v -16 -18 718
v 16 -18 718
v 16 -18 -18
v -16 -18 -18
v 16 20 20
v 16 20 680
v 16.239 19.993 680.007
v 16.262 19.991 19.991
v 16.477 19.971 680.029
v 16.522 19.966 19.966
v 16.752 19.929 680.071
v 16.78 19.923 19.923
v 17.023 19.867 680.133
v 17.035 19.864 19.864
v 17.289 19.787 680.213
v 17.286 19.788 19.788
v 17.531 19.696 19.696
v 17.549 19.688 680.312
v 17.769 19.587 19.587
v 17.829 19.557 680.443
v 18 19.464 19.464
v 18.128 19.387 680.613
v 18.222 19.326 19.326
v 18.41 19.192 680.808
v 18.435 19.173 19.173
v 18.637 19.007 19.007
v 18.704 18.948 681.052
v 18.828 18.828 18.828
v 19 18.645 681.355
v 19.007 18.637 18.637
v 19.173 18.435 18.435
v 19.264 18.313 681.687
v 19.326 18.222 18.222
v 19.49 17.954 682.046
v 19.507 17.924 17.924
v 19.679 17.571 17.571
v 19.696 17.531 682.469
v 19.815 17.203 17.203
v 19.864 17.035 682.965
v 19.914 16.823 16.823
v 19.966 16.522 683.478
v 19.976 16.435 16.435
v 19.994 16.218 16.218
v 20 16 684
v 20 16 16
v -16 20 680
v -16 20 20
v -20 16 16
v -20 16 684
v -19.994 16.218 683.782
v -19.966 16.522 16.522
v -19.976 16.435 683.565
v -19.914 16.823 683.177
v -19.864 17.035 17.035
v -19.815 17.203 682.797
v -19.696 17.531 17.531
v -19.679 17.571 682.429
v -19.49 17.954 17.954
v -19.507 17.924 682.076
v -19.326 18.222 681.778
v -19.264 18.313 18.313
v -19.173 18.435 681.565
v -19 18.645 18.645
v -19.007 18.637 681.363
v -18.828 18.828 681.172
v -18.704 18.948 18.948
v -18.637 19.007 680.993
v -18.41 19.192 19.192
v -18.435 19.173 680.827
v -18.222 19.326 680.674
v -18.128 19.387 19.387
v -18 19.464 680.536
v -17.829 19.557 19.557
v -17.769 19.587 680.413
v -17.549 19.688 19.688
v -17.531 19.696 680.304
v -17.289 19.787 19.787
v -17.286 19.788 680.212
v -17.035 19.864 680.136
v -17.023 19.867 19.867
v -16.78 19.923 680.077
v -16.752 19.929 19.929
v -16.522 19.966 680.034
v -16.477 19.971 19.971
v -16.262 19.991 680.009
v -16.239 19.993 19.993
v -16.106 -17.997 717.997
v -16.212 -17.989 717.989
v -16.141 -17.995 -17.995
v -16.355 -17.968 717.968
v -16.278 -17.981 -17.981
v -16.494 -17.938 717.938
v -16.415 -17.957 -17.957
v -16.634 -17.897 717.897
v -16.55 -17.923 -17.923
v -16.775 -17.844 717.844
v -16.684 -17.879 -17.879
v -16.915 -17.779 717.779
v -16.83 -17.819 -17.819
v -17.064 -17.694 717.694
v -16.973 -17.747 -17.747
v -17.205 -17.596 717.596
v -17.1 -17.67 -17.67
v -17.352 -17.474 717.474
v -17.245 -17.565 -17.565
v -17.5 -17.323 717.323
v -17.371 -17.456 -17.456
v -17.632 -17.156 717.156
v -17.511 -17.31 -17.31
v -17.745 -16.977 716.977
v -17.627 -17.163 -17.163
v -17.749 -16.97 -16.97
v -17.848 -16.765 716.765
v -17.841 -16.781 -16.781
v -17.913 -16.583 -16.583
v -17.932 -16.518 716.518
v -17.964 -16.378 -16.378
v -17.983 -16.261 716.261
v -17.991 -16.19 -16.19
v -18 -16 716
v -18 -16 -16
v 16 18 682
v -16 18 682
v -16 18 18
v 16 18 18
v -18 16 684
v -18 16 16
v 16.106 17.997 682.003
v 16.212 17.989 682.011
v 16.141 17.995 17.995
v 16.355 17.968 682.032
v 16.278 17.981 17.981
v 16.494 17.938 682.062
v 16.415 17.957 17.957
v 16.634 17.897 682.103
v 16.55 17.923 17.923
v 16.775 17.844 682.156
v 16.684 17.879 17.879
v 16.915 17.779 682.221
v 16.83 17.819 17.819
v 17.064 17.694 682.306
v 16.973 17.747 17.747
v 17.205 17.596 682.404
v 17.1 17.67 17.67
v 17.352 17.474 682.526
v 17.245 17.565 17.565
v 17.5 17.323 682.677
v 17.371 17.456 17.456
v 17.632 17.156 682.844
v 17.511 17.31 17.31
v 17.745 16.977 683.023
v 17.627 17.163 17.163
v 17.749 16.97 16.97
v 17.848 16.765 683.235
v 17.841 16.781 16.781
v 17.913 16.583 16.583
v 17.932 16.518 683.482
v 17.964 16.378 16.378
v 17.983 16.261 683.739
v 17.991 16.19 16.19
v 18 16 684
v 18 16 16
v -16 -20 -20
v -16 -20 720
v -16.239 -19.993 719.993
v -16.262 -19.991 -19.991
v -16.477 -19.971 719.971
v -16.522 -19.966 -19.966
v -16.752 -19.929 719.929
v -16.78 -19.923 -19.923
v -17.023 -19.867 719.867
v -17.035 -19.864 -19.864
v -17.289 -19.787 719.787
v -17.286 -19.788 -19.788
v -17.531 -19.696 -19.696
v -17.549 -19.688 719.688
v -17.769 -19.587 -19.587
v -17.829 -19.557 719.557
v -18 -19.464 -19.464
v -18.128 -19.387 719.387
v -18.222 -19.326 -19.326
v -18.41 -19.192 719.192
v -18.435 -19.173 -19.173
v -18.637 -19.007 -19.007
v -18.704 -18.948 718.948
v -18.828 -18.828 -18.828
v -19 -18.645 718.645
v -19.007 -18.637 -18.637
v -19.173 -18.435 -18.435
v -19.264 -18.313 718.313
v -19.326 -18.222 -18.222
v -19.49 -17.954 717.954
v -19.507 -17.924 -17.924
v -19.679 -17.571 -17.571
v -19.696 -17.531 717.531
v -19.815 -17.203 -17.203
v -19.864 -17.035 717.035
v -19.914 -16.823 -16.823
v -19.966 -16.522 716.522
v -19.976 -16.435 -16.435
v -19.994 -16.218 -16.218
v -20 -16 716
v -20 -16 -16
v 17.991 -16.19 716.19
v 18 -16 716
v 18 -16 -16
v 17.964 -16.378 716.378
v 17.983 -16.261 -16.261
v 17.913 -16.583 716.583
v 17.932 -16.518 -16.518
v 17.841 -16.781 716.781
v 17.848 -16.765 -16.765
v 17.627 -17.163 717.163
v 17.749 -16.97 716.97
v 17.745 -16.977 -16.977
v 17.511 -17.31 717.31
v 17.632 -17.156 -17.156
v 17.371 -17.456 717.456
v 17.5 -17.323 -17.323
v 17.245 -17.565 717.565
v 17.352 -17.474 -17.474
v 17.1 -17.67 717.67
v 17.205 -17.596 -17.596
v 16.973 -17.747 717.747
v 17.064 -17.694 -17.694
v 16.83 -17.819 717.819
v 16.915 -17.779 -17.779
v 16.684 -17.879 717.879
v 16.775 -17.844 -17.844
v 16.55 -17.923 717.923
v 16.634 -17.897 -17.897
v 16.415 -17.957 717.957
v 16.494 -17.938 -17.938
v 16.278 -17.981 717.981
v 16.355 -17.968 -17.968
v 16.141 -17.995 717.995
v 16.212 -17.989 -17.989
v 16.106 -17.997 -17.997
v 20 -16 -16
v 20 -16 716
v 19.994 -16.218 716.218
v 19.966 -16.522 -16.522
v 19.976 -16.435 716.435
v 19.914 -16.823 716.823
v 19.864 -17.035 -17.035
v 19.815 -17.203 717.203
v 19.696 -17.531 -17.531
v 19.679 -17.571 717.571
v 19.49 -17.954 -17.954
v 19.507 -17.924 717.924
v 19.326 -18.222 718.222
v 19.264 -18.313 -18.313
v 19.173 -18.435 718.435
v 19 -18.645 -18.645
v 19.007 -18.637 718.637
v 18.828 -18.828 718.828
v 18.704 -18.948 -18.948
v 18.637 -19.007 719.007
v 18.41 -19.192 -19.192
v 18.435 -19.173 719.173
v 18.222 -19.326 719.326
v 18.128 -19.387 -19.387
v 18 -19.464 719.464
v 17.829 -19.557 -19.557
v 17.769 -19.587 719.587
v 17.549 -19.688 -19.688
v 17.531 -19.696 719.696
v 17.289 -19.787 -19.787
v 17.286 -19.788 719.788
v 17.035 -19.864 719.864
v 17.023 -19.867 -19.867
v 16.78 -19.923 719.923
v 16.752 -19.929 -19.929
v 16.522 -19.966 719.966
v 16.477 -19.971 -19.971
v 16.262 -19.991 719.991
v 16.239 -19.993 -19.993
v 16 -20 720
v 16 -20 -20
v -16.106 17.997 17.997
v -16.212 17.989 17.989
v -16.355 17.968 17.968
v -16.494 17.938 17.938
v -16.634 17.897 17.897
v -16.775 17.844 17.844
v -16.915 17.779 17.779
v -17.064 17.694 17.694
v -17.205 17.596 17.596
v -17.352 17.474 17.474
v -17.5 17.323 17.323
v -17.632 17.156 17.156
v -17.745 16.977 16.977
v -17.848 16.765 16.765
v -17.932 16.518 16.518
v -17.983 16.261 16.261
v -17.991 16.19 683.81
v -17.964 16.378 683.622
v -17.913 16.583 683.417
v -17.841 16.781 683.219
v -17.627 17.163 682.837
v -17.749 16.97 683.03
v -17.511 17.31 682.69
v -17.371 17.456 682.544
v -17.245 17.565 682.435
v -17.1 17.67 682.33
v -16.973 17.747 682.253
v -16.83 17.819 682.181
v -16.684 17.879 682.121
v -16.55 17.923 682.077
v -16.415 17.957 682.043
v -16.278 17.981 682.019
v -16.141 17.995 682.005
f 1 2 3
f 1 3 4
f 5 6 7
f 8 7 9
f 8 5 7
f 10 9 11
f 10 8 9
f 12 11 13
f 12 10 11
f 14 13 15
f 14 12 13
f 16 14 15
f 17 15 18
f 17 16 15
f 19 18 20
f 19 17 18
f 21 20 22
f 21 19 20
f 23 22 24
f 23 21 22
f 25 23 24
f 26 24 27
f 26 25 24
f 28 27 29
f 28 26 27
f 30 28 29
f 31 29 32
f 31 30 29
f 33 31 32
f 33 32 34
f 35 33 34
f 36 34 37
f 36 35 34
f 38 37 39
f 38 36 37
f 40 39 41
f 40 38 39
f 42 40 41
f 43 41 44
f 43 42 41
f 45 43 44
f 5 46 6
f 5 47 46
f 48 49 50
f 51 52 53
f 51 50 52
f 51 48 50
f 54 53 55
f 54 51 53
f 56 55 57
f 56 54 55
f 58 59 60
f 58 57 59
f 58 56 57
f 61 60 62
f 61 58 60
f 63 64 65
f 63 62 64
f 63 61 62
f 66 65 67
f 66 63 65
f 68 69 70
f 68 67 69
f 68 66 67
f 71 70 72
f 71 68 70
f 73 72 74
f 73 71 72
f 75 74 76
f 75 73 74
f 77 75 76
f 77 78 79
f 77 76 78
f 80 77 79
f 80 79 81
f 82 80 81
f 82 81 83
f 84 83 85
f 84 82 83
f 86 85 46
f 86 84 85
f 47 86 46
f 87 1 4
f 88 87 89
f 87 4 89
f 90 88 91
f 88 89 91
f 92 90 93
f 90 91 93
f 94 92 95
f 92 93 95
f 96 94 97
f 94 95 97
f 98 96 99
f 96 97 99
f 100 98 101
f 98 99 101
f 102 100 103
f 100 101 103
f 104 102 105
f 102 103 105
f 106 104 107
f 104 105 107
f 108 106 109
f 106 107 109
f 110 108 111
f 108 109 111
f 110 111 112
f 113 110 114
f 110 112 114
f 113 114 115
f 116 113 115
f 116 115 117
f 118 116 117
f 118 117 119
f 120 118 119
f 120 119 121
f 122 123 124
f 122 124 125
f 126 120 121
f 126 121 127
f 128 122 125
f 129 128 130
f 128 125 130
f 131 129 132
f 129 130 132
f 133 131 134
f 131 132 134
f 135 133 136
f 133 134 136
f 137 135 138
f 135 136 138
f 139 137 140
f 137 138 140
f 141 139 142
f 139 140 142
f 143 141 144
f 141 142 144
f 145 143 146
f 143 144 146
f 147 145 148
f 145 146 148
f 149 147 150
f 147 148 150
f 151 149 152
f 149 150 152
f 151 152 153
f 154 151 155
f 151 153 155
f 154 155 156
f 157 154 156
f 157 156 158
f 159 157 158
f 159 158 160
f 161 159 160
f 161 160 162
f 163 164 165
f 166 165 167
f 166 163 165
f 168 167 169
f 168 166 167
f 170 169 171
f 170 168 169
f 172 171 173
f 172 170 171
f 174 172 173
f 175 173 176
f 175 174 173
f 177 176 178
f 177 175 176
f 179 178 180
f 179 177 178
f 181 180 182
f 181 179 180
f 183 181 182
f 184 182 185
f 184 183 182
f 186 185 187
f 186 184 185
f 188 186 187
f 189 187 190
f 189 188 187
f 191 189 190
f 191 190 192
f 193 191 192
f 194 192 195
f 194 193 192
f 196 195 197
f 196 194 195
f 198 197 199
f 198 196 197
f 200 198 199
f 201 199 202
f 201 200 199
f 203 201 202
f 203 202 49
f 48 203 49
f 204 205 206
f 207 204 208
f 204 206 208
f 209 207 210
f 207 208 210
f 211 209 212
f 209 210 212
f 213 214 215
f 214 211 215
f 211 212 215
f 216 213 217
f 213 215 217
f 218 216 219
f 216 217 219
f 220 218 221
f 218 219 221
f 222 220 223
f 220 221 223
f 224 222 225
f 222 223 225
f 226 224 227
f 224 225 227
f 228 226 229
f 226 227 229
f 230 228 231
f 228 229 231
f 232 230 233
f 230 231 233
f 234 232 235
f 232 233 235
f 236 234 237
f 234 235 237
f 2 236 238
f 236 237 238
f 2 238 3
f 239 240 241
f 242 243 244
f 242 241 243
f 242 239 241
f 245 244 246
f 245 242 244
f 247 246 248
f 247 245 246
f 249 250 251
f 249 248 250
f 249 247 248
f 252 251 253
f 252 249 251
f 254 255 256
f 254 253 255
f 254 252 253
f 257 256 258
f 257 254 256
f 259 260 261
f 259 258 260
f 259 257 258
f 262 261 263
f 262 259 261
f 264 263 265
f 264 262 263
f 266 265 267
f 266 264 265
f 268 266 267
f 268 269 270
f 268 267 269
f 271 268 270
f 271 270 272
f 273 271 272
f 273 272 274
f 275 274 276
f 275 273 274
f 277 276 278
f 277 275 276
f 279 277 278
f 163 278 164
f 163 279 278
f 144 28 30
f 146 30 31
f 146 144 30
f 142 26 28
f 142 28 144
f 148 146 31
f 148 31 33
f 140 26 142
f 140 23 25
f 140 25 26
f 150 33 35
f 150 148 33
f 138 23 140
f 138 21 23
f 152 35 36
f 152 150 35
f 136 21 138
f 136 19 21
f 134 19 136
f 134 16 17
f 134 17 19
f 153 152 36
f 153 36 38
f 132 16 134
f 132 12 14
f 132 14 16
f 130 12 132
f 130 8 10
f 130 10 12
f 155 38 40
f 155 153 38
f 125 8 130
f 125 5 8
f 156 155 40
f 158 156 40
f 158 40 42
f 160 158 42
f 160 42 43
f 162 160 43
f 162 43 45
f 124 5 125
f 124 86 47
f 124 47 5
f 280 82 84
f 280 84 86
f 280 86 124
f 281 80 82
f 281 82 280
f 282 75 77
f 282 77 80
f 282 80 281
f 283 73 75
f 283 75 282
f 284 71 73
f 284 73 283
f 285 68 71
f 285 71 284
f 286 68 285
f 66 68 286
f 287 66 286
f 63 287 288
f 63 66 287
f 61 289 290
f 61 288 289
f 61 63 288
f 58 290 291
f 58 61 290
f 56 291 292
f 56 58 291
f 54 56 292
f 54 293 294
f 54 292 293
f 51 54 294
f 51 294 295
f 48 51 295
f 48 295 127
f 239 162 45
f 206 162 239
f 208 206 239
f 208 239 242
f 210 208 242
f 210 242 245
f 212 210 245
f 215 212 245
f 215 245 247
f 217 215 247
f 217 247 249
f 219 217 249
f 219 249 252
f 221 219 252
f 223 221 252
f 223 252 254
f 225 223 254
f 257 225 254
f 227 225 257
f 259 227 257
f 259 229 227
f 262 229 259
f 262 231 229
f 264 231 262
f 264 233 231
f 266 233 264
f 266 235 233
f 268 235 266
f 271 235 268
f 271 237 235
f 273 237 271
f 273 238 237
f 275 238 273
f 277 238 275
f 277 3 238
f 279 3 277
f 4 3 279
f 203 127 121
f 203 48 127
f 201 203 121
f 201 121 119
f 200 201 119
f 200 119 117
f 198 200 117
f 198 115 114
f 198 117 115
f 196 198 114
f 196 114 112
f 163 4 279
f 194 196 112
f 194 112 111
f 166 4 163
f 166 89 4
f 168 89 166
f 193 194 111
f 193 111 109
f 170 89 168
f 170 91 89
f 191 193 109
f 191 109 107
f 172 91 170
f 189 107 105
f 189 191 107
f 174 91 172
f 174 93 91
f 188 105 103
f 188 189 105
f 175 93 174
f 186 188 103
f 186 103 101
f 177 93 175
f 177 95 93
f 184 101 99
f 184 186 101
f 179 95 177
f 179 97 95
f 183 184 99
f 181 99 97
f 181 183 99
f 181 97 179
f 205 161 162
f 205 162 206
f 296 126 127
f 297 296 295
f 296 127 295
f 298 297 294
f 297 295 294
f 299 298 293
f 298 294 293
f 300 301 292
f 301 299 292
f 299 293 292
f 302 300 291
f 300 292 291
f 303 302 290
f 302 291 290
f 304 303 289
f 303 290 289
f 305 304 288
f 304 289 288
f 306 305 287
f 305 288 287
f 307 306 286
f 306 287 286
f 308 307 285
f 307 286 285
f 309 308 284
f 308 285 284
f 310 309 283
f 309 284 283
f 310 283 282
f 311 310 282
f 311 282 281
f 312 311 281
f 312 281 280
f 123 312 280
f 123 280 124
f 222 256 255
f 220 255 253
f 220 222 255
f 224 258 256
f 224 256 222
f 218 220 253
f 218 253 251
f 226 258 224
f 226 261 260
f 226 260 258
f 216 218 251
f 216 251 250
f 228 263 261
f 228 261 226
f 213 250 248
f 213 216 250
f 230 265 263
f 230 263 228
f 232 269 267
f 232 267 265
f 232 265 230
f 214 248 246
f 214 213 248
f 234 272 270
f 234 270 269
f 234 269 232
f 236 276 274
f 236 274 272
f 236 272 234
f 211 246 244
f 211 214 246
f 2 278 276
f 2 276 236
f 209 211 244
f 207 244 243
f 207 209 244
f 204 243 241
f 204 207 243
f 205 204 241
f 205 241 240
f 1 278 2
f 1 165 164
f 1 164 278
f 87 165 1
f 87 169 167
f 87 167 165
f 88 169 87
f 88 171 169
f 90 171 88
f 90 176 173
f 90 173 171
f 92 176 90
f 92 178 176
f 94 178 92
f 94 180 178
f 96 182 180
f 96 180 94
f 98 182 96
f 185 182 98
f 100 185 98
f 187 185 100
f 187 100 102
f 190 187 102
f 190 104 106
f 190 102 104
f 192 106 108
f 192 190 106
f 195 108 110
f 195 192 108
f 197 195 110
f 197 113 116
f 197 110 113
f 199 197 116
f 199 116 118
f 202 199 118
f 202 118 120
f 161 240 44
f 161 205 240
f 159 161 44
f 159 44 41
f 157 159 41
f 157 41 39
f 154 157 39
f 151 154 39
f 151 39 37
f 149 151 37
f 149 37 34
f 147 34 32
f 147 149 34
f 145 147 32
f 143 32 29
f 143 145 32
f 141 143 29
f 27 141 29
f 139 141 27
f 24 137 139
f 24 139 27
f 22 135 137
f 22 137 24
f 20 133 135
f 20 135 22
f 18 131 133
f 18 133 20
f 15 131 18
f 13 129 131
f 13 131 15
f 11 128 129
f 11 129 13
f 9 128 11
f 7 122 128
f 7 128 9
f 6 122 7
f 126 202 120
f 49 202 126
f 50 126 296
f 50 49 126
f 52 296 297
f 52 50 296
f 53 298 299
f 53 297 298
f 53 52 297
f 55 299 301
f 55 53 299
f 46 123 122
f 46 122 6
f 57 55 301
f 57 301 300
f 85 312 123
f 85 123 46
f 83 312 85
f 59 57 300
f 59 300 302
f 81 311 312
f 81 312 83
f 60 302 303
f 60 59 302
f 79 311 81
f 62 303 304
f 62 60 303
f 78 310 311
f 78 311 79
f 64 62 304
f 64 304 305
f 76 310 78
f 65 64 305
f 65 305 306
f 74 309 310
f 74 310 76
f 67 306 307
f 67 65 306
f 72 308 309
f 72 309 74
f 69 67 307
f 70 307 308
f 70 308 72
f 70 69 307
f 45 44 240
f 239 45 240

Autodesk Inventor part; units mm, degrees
ref_plane "Start plane" through (0, 0, -20) normal (0, 0, 1) x (1, 0, 0)
ref_plane "End plane" through (0, 0, 720) normal (0, 0, 1) x (1, 0, 0)
sketch "Sketch" plane through (0, 0, 0) normal (0, 0, 1) x (1, 0, 0)
  line L0 (-20, -16) -> (-20, 16)
  line L1 (-16, 20) -> (16, 20)
  line L2 (20, 16) -> (20, -16)
  line L3 (16, -20) -> (-16, -20)
  arc A0 (-20, -16) -> (-16, -20) centre (-16, -16) ccw
  arc A1 (20, 16) -> (16, 20) centre (16, 16) ccw
  arc A2 (-16, 20) -> (-20, 16) centre (-16, 16) ccw
  arc A3 (16, -20) -> (20, -16) centre (16, -16) ccw
  arc A4 (-16, 18) -> (-18, 16) centre (-16, 16) ccw
  line L4 (-16, 18) -> (16, 18)
  arc A5 (18, 16) -> (16, 18) centre (16, 16) ccw
  line L5 (18, 16) -> (18, -16)
  arc A6 (16, -18) -> (18, -16) centre (16, -16) ccw
  line L6 (16, -18) -> (-16, -18)
  arc A7 (-18, -16) -> (-16, -18) centre (-16, -16) ccw
  line L7 (-18, -16) -> (-18, 16)
  line L8 (0, 29.1598) -> (0, -29.1598) construction
  line L9 (-29.1598, 0) -> (29.1598, 0) construction
  dimension "d7" = 4
  dimension "d9" = 40
  dimension "d11" = 40
  dimension "d12" = 2
  dimension "d15" = 20
  dimension "d16" = 20
extrude "Body" add sketch "Sketch" along normal up to surface (740 mm away) from surface at -20
sketch "Sketch3" plane through (0, 0, 0) normal (0, 0, 1) x (1, 0, 0)
  line L0 (0, 0) -> (10, 0)
ref_plane "Work Plane3" through (0, 0, 0) normal (0, -1, 0) x (1, 0, 0)
sketch "Sketch4" plane through (0, 0, 0) normal (0, -1, 0) x (1, 0, 0)
  line L0 (-2, -20) -> (12, -20)
  line L1 (-2, 720) -> (12, 720)
  dimension "d18" = 740
ref_plane "Work Plane4" through (0, -20, -20) normal (0, 0.7071, -0.7071) x (1, 0, 0)
split "Split1" plane through (0, -20, -20) removes the side toward (0, 0.7071, -0.7071)
ref_plane "Work Plane5" through (0, -20, 720) normal (0, 0.7071, 0.7071) x (1, 0, 0)
split "Split2" plane through (0, -20, 720) removes the side toward (0, 0.7071, 0.7071)
equation "\"d7\" = G_IR"
equation "\"d9\" = G_W"
equation "\"d11\" = G_H"
equation "\"d12\" = G_T"
equation "\"d15\" = 0.5 * d9"
equation "\"d16\" = 0.5 * d11"
equation "\"d3\" = G_L"
equation "\"G_W\" = 40"
equation "\"G_H\" = 40"
equation "\"G_T\" = 2"
equation "\"G_IR\" = 4"
equation "\"G_L\" = d18"
equation "\"G_OFFSET_START\" = 20"
equation "\"G_OFFSET_END\" = 20"
equation "\"d13\" = -G_OFFSET_START"
equation "\"d14\" = G_OFFSET_END + B_L"
equation "\"B_L\" = 700"
properties part number "ISO 4019 - 40x40x2 - 740" material "Steel, Mild"
